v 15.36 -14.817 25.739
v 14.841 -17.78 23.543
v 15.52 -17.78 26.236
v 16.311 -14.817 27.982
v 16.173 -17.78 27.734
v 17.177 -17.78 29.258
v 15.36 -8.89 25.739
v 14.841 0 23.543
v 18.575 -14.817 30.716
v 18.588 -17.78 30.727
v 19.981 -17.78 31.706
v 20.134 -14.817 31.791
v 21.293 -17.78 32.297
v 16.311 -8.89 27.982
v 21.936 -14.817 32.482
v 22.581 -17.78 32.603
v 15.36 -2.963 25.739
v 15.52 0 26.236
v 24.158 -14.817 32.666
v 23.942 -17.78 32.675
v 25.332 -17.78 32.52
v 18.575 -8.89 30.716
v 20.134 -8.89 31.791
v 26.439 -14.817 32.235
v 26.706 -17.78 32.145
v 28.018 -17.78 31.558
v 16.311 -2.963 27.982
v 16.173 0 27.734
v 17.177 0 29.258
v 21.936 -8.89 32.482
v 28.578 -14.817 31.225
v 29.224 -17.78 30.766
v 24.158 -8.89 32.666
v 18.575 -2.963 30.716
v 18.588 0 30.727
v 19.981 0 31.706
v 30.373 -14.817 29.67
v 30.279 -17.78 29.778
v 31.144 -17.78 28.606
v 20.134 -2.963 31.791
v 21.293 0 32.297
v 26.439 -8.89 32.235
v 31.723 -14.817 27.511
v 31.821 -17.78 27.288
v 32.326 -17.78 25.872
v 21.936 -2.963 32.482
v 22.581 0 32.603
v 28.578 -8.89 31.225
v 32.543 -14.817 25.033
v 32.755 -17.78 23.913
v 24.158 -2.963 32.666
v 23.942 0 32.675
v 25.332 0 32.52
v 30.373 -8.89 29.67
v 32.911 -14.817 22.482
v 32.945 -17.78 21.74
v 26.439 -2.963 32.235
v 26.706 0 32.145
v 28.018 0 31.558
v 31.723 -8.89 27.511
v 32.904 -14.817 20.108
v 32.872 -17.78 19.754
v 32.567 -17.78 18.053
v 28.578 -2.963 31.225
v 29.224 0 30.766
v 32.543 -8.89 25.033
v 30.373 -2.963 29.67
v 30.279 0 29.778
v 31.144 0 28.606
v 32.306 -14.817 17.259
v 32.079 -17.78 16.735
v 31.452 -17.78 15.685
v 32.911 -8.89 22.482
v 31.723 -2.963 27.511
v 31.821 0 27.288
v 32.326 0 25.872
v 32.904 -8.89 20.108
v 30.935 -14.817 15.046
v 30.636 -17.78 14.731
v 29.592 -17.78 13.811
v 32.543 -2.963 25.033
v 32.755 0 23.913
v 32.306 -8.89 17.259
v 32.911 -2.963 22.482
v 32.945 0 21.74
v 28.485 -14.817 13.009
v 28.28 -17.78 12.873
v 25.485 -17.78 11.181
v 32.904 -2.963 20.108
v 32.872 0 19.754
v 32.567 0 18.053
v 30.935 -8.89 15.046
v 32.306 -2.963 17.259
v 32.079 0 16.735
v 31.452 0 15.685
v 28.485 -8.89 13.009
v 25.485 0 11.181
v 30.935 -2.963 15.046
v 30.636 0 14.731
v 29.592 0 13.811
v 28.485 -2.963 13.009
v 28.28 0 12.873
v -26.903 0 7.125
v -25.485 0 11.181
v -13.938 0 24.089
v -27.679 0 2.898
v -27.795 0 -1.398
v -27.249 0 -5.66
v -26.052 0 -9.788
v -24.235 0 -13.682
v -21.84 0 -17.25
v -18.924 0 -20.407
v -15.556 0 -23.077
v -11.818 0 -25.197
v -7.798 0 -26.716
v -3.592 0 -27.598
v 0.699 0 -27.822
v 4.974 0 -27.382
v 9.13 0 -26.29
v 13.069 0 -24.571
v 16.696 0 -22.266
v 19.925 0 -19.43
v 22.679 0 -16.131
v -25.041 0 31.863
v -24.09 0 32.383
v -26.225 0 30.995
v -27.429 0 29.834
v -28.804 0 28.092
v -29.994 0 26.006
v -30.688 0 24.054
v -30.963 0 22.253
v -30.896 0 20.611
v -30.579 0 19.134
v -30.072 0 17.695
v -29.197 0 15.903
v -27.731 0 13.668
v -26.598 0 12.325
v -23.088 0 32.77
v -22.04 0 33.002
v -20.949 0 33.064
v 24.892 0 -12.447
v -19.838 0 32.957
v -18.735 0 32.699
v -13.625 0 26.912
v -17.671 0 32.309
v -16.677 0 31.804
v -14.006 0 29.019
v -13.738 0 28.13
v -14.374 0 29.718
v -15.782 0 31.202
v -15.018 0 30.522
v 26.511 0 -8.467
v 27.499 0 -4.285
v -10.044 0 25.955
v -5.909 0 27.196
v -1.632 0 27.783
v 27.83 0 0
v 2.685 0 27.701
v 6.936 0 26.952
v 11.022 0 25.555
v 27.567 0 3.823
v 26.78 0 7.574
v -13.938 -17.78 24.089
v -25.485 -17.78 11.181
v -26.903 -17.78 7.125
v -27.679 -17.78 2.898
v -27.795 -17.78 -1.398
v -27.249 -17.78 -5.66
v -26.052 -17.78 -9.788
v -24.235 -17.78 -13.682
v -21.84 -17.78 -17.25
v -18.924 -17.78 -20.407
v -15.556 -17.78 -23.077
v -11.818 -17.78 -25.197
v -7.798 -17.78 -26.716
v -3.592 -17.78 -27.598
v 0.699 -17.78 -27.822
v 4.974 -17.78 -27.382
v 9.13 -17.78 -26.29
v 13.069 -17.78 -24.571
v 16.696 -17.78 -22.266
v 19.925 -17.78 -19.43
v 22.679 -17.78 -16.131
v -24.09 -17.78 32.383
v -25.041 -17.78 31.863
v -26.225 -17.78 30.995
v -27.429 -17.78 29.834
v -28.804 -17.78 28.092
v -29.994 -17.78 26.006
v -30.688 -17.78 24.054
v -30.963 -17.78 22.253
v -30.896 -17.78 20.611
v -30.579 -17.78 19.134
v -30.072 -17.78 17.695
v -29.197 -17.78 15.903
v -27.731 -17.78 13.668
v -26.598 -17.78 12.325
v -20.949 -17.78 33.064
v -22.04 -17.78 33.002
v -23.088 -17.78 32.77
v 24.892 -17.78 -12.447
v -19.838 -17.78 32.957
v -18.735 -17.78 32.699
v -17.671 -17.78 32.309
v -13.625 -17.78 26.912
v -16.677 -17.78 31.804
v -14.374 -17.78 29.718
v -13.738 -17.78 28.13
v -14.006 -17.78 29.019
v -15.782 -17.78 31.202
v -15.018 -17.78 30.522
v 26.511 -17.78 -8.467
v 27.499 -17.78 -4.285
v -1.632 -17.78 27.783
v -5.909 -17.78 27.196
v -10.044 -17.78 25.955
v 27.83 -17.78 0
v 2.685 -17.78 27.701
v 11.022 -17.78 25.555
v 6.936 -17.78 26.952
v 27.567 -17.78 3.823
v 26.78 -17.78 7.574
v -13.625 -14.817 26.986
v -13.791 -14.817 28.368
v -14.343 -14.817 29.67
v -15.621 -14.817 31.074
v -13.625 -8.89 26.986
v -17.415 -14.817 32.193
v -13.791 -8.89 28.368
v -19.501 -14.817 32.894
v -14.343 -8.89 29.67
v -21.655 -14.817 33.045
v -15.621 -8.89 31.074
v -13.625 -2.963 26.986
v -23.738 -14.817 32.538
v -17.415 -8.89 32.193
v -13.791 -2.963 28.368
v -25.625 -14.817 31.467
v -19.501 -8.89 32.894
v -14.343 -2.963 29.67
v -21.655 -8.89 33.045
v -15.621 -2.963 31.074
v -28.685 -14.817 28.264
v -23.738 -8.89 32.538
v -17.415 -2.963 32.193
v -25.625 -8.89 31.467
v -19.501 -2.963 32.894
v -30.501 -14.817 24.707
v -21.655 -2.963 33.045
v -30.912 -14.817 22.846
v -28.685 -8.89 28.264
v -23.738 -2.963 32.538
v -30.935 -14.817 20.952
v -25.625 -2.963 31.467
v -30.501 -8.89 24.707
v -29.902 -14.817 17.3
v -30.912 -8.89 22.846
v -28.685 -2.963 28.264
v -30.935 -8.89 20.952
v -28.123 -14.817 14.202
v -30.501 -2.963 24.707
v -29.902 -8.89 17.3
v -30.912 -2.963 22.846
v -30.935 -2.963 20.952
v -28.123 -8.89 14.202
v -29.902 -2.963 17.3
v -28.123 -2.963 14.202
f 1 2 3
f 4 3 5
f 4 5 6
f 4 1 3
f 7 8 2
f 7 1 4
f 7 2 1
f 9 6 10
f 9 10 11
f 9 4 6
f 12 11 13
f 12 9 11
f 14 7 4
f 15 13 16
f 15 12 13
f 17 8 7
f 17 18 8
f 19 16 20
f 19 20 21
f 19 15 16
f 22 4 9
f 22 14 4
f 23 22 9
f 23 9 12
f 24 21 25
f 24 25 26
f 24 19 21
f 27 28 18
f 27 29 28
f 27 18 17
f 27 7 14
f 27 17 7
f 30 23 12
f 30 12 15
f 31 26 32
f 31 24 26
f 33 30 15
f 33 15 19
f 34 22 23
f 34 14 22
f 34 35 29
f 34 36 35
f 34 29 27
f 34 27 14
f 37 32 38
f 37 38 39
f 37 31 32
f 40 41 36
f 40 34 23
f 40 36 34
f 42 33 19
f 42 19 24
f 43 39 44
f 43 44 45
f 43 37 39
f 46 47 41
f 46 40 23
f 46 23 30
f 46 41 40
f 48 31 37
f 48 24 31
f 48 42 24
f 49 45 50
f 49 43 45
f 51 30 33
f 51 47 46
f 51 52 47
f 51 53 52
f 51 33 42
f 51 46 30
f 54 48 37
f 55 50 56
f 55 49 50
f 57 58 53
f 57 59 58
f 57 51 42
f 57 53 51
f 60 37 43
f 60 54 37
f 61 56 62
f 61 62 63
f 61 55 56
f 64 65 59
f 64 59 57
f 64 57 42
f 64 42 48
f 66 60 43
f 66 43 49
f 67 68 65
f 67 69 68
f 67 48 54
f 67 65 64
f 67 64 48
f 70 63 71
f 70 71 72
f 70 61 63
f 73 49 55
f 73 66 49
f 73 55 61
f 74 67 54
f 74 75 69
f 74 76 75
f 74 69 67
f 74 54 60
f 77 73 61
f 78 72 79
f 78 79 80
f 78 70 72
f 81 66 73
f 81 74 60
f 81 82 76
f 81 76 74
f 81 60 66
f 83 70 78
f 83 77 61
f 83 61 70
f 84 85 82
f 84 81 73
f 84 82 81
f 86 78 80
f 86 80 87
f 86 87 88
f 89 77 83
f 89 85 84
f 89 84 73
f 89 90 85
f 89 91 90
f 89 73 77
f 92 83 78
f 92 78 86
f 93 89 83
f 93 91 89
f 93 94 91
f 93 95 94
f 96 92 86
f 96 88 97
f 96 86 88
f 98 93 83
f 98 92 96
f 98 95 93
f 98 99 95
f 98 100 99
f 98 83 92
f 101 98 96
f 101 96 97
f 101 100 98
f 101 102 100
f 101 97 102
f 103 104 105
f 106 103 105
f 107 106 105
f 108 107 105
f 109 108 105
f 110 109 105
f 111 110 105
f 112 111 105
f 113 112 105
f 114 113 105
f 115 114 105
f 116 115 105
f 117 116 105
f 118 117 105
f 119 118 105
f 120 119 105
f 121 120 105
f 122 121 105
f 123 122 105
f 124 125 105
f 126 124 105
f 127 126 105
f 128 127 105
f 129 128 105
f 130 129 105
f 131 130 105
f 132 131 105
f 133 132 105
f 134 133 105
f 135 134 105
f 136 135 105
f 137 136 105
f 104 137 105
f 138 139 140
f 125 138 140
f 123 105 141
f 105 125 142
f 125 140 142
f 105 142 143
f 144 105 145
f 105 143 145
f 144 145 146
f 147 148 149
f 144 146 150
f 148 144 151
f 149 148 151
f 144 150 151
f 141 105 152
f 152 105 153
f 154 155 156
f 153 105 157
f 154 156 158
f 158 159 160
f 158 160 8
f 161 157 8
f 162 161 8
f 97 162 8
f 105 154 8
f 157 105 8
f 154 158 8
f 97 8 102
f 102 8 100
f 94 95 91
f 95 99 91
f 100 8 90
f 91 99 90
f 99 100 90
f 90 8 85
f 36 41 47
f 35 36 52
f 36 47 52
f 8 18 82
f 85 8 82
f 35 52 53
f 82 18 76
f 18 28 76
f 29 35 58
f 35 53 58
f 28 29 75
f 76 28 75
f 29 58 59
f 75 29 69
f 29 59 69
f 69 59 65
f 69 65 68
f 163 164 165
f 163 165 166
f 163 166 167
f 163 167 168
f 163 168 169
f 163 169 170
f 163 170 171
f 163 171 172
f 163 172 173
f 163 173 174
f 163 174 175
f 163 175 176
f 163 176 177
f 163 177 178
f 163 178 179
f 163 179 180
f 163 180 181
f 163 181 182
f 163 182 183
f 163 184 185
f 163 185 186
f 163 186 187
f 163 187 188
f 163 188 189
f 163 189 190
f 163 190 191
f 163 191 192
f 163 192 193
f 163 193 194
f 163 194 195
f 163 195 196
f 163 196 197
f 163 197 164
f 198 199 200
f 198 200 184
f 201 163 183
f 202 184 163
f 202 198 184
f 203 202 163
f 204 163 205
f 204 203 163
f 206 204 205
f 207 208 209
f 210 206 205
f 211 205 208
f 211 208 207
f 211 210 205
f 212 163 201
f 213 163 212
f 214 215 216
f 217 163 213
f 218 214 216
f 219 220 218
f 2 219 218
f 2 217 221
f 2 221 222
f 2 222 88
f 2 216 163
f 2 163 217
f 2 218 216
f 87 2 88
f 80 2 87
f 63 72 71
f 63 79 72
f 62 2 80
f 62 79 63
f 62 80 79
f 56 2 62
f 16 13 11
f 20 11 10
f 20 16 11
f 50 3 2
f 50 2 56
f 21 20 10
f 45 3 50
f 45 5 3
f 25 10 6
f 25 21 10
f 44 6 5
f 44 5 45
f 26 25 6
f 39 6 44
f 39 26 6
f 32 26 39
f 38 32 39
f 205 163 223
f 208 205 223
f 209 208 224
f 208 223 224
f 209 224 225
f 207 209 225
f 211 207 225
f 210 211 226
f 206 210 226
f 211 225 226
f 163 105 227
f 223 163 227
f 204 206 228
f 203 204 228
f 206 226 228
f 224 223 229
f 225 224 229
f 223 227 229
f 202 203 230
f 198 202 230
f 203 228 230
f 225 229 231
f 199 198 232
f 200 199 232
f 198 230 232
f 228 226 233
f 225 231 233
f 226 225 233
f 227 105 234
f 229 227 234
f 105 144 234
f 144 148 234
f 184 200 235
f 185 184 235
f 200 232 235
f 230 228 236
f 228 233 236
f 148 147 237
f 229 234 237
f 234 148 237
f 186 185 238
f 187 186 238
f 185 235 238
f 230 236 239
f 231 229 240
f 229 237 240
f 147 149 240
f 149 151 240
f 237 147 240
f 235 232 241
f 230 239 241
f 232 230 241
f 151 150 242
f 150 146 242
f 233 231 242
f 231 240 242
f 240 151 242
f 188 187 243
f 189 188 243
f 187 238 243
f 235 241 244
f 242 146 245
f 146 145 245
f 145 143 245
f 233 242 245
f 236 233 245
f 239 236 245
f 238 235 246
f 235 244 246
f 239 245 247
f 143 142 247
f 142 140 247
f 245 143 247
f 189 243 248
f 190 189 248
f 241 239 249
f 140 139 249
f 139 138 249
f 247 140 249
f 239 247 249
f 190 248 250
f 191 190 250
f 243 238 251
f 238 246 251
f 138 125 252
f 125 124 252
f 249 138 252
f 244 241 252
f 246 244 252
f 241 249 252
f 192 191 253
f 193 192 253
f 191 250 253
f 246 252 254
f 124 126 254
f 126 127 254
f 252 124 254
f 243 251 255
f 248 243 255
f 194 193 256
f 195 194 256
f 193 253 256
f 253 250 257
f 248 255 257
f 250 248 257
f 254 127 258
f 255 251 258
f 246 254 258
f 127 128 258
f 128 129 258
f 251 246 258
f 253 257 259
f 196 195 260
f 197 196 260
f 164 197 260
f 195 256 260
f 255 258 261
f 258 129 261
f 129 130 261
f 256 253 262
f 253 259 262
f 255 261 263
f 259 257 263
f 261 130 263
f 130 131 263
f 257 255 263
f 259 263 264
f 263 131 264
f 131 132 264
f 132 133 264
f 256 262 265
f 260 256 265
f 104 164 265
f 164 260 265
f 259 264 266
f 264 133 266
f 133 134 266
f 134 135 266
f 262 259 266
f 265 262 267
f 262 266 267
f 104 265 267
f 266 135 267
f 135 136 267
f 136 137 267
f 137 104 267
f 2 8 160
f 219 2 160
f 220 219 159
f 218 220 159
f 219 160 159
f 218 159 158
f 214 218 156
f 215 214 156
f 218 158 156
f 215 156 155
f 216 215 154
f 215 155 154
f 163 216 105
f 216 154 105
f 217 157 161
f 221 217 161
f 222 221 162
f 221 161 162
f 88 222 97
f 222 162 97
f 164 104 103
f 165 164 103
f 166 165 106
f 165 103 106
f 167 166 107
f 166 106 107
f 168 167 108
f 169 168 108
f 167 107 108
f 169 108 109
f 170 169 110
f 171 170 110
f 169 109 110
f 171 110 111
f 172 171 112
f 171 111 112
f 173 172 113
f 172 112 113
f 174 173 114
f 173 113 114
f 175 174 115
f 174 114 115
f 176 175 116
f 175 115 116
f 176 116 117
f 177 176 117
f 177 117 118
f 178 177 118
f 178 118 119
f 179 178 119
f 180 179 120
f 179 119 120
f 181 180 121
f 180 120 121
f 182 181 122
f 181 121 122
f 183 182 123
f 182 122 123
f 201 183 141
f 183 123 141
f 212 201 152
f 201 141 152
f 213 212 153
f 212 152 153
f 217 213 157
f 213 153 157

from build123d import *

# Parameters (mm, degrees)
F2_DEPTH = 17.78


# Not quite as in the source:
# - the program builds the solid bodies; features that only make, move or delete a surface that nothing else refers to are left out


with BuildPart() as f2:
    # F0 (on Front) → F2 (new body)
    with BuildSketch(Plane.XZ):
        with BuildLine():
            ThreePointArc((-25.4854624617, 11.1814313142), (-5.7123399341, -27.2378849325), (27.8304366318, 0))
            ThreePointArc((27.8304366318, 0), (27.2378849325, 5.7123399341), (25.4854624617, 11.1814313142))
            ThreePointArc((25.4854624617, 11.1814313142), (21.0894268244, 18.1595506369), (14.8413239123, 23.5429035518))
            ThreePointArc((14.8413239123, 23.5429035518), (0.5278354358, 27.8254306862), (-13.9377721615, 24.088829575))
            ThreePointArc((-13.9377721615, 24.088829575), (-20.7412171654, 18.5562688495), (-25.4854624617, 11.1814313142))
        make_face()
        with BuildLine():
            ThreePointArc((14.8413239123, 23.5429035518), (21.0894268244, 18.1595506369), (25.4854624617, 11.1814313142))
            add(Edge.make_bspline(
                [(14.8413239123, 23.5429035518), (15.1413649797, 25.0040188999), (15.7986912782, 28.260631254), (21.5932657669, 34.1059217282), (32.0206442284, 30.9740164086), (33.5512212932, 20.0305004366), (31.4640007875, 14.6491656343), (27.5467324966, 12.3770350557), (25.4854624617, 11.1814313142)],
                knots=[0, 0, 0, 0, 0.1361039331, 0.3050174671, 0.492706302, 0.690645138, 0.8373233948, 1, 1, 1, 1], degree=3))
        make_face()
        with BuildLine():
            add(Edge.make_bspline(
                [(-13.9377721615, 24.088829575), (-13.6149779351, 26.0443059259), (-12.9059851741, 30.3443635616), (-22.1612583852, 34.9079889108), (-29.3313166227, 28.6211389756), (-32.0623724786, 21.0496503131), (-28.3666845132, 14.0775517686), (-26.3518766449, 12.0465521212), (-25.4854624617, 11.1814313142)],
                knots=[0, 0, 0, 0, 0.1517157978, 0.3337238633, 0.5207376803, 0.6981342072, 0.871564045, 1, 1, 1, 1], degree=3))
            ThreePointArc((-25.4854624617, 11.1814313142), (-20.7412171654, 18.5562688495), (-13.9377721615, 24.088829575))
        make_face()
    extrude(amount=F2_DEPTH)


solid = f2.part
